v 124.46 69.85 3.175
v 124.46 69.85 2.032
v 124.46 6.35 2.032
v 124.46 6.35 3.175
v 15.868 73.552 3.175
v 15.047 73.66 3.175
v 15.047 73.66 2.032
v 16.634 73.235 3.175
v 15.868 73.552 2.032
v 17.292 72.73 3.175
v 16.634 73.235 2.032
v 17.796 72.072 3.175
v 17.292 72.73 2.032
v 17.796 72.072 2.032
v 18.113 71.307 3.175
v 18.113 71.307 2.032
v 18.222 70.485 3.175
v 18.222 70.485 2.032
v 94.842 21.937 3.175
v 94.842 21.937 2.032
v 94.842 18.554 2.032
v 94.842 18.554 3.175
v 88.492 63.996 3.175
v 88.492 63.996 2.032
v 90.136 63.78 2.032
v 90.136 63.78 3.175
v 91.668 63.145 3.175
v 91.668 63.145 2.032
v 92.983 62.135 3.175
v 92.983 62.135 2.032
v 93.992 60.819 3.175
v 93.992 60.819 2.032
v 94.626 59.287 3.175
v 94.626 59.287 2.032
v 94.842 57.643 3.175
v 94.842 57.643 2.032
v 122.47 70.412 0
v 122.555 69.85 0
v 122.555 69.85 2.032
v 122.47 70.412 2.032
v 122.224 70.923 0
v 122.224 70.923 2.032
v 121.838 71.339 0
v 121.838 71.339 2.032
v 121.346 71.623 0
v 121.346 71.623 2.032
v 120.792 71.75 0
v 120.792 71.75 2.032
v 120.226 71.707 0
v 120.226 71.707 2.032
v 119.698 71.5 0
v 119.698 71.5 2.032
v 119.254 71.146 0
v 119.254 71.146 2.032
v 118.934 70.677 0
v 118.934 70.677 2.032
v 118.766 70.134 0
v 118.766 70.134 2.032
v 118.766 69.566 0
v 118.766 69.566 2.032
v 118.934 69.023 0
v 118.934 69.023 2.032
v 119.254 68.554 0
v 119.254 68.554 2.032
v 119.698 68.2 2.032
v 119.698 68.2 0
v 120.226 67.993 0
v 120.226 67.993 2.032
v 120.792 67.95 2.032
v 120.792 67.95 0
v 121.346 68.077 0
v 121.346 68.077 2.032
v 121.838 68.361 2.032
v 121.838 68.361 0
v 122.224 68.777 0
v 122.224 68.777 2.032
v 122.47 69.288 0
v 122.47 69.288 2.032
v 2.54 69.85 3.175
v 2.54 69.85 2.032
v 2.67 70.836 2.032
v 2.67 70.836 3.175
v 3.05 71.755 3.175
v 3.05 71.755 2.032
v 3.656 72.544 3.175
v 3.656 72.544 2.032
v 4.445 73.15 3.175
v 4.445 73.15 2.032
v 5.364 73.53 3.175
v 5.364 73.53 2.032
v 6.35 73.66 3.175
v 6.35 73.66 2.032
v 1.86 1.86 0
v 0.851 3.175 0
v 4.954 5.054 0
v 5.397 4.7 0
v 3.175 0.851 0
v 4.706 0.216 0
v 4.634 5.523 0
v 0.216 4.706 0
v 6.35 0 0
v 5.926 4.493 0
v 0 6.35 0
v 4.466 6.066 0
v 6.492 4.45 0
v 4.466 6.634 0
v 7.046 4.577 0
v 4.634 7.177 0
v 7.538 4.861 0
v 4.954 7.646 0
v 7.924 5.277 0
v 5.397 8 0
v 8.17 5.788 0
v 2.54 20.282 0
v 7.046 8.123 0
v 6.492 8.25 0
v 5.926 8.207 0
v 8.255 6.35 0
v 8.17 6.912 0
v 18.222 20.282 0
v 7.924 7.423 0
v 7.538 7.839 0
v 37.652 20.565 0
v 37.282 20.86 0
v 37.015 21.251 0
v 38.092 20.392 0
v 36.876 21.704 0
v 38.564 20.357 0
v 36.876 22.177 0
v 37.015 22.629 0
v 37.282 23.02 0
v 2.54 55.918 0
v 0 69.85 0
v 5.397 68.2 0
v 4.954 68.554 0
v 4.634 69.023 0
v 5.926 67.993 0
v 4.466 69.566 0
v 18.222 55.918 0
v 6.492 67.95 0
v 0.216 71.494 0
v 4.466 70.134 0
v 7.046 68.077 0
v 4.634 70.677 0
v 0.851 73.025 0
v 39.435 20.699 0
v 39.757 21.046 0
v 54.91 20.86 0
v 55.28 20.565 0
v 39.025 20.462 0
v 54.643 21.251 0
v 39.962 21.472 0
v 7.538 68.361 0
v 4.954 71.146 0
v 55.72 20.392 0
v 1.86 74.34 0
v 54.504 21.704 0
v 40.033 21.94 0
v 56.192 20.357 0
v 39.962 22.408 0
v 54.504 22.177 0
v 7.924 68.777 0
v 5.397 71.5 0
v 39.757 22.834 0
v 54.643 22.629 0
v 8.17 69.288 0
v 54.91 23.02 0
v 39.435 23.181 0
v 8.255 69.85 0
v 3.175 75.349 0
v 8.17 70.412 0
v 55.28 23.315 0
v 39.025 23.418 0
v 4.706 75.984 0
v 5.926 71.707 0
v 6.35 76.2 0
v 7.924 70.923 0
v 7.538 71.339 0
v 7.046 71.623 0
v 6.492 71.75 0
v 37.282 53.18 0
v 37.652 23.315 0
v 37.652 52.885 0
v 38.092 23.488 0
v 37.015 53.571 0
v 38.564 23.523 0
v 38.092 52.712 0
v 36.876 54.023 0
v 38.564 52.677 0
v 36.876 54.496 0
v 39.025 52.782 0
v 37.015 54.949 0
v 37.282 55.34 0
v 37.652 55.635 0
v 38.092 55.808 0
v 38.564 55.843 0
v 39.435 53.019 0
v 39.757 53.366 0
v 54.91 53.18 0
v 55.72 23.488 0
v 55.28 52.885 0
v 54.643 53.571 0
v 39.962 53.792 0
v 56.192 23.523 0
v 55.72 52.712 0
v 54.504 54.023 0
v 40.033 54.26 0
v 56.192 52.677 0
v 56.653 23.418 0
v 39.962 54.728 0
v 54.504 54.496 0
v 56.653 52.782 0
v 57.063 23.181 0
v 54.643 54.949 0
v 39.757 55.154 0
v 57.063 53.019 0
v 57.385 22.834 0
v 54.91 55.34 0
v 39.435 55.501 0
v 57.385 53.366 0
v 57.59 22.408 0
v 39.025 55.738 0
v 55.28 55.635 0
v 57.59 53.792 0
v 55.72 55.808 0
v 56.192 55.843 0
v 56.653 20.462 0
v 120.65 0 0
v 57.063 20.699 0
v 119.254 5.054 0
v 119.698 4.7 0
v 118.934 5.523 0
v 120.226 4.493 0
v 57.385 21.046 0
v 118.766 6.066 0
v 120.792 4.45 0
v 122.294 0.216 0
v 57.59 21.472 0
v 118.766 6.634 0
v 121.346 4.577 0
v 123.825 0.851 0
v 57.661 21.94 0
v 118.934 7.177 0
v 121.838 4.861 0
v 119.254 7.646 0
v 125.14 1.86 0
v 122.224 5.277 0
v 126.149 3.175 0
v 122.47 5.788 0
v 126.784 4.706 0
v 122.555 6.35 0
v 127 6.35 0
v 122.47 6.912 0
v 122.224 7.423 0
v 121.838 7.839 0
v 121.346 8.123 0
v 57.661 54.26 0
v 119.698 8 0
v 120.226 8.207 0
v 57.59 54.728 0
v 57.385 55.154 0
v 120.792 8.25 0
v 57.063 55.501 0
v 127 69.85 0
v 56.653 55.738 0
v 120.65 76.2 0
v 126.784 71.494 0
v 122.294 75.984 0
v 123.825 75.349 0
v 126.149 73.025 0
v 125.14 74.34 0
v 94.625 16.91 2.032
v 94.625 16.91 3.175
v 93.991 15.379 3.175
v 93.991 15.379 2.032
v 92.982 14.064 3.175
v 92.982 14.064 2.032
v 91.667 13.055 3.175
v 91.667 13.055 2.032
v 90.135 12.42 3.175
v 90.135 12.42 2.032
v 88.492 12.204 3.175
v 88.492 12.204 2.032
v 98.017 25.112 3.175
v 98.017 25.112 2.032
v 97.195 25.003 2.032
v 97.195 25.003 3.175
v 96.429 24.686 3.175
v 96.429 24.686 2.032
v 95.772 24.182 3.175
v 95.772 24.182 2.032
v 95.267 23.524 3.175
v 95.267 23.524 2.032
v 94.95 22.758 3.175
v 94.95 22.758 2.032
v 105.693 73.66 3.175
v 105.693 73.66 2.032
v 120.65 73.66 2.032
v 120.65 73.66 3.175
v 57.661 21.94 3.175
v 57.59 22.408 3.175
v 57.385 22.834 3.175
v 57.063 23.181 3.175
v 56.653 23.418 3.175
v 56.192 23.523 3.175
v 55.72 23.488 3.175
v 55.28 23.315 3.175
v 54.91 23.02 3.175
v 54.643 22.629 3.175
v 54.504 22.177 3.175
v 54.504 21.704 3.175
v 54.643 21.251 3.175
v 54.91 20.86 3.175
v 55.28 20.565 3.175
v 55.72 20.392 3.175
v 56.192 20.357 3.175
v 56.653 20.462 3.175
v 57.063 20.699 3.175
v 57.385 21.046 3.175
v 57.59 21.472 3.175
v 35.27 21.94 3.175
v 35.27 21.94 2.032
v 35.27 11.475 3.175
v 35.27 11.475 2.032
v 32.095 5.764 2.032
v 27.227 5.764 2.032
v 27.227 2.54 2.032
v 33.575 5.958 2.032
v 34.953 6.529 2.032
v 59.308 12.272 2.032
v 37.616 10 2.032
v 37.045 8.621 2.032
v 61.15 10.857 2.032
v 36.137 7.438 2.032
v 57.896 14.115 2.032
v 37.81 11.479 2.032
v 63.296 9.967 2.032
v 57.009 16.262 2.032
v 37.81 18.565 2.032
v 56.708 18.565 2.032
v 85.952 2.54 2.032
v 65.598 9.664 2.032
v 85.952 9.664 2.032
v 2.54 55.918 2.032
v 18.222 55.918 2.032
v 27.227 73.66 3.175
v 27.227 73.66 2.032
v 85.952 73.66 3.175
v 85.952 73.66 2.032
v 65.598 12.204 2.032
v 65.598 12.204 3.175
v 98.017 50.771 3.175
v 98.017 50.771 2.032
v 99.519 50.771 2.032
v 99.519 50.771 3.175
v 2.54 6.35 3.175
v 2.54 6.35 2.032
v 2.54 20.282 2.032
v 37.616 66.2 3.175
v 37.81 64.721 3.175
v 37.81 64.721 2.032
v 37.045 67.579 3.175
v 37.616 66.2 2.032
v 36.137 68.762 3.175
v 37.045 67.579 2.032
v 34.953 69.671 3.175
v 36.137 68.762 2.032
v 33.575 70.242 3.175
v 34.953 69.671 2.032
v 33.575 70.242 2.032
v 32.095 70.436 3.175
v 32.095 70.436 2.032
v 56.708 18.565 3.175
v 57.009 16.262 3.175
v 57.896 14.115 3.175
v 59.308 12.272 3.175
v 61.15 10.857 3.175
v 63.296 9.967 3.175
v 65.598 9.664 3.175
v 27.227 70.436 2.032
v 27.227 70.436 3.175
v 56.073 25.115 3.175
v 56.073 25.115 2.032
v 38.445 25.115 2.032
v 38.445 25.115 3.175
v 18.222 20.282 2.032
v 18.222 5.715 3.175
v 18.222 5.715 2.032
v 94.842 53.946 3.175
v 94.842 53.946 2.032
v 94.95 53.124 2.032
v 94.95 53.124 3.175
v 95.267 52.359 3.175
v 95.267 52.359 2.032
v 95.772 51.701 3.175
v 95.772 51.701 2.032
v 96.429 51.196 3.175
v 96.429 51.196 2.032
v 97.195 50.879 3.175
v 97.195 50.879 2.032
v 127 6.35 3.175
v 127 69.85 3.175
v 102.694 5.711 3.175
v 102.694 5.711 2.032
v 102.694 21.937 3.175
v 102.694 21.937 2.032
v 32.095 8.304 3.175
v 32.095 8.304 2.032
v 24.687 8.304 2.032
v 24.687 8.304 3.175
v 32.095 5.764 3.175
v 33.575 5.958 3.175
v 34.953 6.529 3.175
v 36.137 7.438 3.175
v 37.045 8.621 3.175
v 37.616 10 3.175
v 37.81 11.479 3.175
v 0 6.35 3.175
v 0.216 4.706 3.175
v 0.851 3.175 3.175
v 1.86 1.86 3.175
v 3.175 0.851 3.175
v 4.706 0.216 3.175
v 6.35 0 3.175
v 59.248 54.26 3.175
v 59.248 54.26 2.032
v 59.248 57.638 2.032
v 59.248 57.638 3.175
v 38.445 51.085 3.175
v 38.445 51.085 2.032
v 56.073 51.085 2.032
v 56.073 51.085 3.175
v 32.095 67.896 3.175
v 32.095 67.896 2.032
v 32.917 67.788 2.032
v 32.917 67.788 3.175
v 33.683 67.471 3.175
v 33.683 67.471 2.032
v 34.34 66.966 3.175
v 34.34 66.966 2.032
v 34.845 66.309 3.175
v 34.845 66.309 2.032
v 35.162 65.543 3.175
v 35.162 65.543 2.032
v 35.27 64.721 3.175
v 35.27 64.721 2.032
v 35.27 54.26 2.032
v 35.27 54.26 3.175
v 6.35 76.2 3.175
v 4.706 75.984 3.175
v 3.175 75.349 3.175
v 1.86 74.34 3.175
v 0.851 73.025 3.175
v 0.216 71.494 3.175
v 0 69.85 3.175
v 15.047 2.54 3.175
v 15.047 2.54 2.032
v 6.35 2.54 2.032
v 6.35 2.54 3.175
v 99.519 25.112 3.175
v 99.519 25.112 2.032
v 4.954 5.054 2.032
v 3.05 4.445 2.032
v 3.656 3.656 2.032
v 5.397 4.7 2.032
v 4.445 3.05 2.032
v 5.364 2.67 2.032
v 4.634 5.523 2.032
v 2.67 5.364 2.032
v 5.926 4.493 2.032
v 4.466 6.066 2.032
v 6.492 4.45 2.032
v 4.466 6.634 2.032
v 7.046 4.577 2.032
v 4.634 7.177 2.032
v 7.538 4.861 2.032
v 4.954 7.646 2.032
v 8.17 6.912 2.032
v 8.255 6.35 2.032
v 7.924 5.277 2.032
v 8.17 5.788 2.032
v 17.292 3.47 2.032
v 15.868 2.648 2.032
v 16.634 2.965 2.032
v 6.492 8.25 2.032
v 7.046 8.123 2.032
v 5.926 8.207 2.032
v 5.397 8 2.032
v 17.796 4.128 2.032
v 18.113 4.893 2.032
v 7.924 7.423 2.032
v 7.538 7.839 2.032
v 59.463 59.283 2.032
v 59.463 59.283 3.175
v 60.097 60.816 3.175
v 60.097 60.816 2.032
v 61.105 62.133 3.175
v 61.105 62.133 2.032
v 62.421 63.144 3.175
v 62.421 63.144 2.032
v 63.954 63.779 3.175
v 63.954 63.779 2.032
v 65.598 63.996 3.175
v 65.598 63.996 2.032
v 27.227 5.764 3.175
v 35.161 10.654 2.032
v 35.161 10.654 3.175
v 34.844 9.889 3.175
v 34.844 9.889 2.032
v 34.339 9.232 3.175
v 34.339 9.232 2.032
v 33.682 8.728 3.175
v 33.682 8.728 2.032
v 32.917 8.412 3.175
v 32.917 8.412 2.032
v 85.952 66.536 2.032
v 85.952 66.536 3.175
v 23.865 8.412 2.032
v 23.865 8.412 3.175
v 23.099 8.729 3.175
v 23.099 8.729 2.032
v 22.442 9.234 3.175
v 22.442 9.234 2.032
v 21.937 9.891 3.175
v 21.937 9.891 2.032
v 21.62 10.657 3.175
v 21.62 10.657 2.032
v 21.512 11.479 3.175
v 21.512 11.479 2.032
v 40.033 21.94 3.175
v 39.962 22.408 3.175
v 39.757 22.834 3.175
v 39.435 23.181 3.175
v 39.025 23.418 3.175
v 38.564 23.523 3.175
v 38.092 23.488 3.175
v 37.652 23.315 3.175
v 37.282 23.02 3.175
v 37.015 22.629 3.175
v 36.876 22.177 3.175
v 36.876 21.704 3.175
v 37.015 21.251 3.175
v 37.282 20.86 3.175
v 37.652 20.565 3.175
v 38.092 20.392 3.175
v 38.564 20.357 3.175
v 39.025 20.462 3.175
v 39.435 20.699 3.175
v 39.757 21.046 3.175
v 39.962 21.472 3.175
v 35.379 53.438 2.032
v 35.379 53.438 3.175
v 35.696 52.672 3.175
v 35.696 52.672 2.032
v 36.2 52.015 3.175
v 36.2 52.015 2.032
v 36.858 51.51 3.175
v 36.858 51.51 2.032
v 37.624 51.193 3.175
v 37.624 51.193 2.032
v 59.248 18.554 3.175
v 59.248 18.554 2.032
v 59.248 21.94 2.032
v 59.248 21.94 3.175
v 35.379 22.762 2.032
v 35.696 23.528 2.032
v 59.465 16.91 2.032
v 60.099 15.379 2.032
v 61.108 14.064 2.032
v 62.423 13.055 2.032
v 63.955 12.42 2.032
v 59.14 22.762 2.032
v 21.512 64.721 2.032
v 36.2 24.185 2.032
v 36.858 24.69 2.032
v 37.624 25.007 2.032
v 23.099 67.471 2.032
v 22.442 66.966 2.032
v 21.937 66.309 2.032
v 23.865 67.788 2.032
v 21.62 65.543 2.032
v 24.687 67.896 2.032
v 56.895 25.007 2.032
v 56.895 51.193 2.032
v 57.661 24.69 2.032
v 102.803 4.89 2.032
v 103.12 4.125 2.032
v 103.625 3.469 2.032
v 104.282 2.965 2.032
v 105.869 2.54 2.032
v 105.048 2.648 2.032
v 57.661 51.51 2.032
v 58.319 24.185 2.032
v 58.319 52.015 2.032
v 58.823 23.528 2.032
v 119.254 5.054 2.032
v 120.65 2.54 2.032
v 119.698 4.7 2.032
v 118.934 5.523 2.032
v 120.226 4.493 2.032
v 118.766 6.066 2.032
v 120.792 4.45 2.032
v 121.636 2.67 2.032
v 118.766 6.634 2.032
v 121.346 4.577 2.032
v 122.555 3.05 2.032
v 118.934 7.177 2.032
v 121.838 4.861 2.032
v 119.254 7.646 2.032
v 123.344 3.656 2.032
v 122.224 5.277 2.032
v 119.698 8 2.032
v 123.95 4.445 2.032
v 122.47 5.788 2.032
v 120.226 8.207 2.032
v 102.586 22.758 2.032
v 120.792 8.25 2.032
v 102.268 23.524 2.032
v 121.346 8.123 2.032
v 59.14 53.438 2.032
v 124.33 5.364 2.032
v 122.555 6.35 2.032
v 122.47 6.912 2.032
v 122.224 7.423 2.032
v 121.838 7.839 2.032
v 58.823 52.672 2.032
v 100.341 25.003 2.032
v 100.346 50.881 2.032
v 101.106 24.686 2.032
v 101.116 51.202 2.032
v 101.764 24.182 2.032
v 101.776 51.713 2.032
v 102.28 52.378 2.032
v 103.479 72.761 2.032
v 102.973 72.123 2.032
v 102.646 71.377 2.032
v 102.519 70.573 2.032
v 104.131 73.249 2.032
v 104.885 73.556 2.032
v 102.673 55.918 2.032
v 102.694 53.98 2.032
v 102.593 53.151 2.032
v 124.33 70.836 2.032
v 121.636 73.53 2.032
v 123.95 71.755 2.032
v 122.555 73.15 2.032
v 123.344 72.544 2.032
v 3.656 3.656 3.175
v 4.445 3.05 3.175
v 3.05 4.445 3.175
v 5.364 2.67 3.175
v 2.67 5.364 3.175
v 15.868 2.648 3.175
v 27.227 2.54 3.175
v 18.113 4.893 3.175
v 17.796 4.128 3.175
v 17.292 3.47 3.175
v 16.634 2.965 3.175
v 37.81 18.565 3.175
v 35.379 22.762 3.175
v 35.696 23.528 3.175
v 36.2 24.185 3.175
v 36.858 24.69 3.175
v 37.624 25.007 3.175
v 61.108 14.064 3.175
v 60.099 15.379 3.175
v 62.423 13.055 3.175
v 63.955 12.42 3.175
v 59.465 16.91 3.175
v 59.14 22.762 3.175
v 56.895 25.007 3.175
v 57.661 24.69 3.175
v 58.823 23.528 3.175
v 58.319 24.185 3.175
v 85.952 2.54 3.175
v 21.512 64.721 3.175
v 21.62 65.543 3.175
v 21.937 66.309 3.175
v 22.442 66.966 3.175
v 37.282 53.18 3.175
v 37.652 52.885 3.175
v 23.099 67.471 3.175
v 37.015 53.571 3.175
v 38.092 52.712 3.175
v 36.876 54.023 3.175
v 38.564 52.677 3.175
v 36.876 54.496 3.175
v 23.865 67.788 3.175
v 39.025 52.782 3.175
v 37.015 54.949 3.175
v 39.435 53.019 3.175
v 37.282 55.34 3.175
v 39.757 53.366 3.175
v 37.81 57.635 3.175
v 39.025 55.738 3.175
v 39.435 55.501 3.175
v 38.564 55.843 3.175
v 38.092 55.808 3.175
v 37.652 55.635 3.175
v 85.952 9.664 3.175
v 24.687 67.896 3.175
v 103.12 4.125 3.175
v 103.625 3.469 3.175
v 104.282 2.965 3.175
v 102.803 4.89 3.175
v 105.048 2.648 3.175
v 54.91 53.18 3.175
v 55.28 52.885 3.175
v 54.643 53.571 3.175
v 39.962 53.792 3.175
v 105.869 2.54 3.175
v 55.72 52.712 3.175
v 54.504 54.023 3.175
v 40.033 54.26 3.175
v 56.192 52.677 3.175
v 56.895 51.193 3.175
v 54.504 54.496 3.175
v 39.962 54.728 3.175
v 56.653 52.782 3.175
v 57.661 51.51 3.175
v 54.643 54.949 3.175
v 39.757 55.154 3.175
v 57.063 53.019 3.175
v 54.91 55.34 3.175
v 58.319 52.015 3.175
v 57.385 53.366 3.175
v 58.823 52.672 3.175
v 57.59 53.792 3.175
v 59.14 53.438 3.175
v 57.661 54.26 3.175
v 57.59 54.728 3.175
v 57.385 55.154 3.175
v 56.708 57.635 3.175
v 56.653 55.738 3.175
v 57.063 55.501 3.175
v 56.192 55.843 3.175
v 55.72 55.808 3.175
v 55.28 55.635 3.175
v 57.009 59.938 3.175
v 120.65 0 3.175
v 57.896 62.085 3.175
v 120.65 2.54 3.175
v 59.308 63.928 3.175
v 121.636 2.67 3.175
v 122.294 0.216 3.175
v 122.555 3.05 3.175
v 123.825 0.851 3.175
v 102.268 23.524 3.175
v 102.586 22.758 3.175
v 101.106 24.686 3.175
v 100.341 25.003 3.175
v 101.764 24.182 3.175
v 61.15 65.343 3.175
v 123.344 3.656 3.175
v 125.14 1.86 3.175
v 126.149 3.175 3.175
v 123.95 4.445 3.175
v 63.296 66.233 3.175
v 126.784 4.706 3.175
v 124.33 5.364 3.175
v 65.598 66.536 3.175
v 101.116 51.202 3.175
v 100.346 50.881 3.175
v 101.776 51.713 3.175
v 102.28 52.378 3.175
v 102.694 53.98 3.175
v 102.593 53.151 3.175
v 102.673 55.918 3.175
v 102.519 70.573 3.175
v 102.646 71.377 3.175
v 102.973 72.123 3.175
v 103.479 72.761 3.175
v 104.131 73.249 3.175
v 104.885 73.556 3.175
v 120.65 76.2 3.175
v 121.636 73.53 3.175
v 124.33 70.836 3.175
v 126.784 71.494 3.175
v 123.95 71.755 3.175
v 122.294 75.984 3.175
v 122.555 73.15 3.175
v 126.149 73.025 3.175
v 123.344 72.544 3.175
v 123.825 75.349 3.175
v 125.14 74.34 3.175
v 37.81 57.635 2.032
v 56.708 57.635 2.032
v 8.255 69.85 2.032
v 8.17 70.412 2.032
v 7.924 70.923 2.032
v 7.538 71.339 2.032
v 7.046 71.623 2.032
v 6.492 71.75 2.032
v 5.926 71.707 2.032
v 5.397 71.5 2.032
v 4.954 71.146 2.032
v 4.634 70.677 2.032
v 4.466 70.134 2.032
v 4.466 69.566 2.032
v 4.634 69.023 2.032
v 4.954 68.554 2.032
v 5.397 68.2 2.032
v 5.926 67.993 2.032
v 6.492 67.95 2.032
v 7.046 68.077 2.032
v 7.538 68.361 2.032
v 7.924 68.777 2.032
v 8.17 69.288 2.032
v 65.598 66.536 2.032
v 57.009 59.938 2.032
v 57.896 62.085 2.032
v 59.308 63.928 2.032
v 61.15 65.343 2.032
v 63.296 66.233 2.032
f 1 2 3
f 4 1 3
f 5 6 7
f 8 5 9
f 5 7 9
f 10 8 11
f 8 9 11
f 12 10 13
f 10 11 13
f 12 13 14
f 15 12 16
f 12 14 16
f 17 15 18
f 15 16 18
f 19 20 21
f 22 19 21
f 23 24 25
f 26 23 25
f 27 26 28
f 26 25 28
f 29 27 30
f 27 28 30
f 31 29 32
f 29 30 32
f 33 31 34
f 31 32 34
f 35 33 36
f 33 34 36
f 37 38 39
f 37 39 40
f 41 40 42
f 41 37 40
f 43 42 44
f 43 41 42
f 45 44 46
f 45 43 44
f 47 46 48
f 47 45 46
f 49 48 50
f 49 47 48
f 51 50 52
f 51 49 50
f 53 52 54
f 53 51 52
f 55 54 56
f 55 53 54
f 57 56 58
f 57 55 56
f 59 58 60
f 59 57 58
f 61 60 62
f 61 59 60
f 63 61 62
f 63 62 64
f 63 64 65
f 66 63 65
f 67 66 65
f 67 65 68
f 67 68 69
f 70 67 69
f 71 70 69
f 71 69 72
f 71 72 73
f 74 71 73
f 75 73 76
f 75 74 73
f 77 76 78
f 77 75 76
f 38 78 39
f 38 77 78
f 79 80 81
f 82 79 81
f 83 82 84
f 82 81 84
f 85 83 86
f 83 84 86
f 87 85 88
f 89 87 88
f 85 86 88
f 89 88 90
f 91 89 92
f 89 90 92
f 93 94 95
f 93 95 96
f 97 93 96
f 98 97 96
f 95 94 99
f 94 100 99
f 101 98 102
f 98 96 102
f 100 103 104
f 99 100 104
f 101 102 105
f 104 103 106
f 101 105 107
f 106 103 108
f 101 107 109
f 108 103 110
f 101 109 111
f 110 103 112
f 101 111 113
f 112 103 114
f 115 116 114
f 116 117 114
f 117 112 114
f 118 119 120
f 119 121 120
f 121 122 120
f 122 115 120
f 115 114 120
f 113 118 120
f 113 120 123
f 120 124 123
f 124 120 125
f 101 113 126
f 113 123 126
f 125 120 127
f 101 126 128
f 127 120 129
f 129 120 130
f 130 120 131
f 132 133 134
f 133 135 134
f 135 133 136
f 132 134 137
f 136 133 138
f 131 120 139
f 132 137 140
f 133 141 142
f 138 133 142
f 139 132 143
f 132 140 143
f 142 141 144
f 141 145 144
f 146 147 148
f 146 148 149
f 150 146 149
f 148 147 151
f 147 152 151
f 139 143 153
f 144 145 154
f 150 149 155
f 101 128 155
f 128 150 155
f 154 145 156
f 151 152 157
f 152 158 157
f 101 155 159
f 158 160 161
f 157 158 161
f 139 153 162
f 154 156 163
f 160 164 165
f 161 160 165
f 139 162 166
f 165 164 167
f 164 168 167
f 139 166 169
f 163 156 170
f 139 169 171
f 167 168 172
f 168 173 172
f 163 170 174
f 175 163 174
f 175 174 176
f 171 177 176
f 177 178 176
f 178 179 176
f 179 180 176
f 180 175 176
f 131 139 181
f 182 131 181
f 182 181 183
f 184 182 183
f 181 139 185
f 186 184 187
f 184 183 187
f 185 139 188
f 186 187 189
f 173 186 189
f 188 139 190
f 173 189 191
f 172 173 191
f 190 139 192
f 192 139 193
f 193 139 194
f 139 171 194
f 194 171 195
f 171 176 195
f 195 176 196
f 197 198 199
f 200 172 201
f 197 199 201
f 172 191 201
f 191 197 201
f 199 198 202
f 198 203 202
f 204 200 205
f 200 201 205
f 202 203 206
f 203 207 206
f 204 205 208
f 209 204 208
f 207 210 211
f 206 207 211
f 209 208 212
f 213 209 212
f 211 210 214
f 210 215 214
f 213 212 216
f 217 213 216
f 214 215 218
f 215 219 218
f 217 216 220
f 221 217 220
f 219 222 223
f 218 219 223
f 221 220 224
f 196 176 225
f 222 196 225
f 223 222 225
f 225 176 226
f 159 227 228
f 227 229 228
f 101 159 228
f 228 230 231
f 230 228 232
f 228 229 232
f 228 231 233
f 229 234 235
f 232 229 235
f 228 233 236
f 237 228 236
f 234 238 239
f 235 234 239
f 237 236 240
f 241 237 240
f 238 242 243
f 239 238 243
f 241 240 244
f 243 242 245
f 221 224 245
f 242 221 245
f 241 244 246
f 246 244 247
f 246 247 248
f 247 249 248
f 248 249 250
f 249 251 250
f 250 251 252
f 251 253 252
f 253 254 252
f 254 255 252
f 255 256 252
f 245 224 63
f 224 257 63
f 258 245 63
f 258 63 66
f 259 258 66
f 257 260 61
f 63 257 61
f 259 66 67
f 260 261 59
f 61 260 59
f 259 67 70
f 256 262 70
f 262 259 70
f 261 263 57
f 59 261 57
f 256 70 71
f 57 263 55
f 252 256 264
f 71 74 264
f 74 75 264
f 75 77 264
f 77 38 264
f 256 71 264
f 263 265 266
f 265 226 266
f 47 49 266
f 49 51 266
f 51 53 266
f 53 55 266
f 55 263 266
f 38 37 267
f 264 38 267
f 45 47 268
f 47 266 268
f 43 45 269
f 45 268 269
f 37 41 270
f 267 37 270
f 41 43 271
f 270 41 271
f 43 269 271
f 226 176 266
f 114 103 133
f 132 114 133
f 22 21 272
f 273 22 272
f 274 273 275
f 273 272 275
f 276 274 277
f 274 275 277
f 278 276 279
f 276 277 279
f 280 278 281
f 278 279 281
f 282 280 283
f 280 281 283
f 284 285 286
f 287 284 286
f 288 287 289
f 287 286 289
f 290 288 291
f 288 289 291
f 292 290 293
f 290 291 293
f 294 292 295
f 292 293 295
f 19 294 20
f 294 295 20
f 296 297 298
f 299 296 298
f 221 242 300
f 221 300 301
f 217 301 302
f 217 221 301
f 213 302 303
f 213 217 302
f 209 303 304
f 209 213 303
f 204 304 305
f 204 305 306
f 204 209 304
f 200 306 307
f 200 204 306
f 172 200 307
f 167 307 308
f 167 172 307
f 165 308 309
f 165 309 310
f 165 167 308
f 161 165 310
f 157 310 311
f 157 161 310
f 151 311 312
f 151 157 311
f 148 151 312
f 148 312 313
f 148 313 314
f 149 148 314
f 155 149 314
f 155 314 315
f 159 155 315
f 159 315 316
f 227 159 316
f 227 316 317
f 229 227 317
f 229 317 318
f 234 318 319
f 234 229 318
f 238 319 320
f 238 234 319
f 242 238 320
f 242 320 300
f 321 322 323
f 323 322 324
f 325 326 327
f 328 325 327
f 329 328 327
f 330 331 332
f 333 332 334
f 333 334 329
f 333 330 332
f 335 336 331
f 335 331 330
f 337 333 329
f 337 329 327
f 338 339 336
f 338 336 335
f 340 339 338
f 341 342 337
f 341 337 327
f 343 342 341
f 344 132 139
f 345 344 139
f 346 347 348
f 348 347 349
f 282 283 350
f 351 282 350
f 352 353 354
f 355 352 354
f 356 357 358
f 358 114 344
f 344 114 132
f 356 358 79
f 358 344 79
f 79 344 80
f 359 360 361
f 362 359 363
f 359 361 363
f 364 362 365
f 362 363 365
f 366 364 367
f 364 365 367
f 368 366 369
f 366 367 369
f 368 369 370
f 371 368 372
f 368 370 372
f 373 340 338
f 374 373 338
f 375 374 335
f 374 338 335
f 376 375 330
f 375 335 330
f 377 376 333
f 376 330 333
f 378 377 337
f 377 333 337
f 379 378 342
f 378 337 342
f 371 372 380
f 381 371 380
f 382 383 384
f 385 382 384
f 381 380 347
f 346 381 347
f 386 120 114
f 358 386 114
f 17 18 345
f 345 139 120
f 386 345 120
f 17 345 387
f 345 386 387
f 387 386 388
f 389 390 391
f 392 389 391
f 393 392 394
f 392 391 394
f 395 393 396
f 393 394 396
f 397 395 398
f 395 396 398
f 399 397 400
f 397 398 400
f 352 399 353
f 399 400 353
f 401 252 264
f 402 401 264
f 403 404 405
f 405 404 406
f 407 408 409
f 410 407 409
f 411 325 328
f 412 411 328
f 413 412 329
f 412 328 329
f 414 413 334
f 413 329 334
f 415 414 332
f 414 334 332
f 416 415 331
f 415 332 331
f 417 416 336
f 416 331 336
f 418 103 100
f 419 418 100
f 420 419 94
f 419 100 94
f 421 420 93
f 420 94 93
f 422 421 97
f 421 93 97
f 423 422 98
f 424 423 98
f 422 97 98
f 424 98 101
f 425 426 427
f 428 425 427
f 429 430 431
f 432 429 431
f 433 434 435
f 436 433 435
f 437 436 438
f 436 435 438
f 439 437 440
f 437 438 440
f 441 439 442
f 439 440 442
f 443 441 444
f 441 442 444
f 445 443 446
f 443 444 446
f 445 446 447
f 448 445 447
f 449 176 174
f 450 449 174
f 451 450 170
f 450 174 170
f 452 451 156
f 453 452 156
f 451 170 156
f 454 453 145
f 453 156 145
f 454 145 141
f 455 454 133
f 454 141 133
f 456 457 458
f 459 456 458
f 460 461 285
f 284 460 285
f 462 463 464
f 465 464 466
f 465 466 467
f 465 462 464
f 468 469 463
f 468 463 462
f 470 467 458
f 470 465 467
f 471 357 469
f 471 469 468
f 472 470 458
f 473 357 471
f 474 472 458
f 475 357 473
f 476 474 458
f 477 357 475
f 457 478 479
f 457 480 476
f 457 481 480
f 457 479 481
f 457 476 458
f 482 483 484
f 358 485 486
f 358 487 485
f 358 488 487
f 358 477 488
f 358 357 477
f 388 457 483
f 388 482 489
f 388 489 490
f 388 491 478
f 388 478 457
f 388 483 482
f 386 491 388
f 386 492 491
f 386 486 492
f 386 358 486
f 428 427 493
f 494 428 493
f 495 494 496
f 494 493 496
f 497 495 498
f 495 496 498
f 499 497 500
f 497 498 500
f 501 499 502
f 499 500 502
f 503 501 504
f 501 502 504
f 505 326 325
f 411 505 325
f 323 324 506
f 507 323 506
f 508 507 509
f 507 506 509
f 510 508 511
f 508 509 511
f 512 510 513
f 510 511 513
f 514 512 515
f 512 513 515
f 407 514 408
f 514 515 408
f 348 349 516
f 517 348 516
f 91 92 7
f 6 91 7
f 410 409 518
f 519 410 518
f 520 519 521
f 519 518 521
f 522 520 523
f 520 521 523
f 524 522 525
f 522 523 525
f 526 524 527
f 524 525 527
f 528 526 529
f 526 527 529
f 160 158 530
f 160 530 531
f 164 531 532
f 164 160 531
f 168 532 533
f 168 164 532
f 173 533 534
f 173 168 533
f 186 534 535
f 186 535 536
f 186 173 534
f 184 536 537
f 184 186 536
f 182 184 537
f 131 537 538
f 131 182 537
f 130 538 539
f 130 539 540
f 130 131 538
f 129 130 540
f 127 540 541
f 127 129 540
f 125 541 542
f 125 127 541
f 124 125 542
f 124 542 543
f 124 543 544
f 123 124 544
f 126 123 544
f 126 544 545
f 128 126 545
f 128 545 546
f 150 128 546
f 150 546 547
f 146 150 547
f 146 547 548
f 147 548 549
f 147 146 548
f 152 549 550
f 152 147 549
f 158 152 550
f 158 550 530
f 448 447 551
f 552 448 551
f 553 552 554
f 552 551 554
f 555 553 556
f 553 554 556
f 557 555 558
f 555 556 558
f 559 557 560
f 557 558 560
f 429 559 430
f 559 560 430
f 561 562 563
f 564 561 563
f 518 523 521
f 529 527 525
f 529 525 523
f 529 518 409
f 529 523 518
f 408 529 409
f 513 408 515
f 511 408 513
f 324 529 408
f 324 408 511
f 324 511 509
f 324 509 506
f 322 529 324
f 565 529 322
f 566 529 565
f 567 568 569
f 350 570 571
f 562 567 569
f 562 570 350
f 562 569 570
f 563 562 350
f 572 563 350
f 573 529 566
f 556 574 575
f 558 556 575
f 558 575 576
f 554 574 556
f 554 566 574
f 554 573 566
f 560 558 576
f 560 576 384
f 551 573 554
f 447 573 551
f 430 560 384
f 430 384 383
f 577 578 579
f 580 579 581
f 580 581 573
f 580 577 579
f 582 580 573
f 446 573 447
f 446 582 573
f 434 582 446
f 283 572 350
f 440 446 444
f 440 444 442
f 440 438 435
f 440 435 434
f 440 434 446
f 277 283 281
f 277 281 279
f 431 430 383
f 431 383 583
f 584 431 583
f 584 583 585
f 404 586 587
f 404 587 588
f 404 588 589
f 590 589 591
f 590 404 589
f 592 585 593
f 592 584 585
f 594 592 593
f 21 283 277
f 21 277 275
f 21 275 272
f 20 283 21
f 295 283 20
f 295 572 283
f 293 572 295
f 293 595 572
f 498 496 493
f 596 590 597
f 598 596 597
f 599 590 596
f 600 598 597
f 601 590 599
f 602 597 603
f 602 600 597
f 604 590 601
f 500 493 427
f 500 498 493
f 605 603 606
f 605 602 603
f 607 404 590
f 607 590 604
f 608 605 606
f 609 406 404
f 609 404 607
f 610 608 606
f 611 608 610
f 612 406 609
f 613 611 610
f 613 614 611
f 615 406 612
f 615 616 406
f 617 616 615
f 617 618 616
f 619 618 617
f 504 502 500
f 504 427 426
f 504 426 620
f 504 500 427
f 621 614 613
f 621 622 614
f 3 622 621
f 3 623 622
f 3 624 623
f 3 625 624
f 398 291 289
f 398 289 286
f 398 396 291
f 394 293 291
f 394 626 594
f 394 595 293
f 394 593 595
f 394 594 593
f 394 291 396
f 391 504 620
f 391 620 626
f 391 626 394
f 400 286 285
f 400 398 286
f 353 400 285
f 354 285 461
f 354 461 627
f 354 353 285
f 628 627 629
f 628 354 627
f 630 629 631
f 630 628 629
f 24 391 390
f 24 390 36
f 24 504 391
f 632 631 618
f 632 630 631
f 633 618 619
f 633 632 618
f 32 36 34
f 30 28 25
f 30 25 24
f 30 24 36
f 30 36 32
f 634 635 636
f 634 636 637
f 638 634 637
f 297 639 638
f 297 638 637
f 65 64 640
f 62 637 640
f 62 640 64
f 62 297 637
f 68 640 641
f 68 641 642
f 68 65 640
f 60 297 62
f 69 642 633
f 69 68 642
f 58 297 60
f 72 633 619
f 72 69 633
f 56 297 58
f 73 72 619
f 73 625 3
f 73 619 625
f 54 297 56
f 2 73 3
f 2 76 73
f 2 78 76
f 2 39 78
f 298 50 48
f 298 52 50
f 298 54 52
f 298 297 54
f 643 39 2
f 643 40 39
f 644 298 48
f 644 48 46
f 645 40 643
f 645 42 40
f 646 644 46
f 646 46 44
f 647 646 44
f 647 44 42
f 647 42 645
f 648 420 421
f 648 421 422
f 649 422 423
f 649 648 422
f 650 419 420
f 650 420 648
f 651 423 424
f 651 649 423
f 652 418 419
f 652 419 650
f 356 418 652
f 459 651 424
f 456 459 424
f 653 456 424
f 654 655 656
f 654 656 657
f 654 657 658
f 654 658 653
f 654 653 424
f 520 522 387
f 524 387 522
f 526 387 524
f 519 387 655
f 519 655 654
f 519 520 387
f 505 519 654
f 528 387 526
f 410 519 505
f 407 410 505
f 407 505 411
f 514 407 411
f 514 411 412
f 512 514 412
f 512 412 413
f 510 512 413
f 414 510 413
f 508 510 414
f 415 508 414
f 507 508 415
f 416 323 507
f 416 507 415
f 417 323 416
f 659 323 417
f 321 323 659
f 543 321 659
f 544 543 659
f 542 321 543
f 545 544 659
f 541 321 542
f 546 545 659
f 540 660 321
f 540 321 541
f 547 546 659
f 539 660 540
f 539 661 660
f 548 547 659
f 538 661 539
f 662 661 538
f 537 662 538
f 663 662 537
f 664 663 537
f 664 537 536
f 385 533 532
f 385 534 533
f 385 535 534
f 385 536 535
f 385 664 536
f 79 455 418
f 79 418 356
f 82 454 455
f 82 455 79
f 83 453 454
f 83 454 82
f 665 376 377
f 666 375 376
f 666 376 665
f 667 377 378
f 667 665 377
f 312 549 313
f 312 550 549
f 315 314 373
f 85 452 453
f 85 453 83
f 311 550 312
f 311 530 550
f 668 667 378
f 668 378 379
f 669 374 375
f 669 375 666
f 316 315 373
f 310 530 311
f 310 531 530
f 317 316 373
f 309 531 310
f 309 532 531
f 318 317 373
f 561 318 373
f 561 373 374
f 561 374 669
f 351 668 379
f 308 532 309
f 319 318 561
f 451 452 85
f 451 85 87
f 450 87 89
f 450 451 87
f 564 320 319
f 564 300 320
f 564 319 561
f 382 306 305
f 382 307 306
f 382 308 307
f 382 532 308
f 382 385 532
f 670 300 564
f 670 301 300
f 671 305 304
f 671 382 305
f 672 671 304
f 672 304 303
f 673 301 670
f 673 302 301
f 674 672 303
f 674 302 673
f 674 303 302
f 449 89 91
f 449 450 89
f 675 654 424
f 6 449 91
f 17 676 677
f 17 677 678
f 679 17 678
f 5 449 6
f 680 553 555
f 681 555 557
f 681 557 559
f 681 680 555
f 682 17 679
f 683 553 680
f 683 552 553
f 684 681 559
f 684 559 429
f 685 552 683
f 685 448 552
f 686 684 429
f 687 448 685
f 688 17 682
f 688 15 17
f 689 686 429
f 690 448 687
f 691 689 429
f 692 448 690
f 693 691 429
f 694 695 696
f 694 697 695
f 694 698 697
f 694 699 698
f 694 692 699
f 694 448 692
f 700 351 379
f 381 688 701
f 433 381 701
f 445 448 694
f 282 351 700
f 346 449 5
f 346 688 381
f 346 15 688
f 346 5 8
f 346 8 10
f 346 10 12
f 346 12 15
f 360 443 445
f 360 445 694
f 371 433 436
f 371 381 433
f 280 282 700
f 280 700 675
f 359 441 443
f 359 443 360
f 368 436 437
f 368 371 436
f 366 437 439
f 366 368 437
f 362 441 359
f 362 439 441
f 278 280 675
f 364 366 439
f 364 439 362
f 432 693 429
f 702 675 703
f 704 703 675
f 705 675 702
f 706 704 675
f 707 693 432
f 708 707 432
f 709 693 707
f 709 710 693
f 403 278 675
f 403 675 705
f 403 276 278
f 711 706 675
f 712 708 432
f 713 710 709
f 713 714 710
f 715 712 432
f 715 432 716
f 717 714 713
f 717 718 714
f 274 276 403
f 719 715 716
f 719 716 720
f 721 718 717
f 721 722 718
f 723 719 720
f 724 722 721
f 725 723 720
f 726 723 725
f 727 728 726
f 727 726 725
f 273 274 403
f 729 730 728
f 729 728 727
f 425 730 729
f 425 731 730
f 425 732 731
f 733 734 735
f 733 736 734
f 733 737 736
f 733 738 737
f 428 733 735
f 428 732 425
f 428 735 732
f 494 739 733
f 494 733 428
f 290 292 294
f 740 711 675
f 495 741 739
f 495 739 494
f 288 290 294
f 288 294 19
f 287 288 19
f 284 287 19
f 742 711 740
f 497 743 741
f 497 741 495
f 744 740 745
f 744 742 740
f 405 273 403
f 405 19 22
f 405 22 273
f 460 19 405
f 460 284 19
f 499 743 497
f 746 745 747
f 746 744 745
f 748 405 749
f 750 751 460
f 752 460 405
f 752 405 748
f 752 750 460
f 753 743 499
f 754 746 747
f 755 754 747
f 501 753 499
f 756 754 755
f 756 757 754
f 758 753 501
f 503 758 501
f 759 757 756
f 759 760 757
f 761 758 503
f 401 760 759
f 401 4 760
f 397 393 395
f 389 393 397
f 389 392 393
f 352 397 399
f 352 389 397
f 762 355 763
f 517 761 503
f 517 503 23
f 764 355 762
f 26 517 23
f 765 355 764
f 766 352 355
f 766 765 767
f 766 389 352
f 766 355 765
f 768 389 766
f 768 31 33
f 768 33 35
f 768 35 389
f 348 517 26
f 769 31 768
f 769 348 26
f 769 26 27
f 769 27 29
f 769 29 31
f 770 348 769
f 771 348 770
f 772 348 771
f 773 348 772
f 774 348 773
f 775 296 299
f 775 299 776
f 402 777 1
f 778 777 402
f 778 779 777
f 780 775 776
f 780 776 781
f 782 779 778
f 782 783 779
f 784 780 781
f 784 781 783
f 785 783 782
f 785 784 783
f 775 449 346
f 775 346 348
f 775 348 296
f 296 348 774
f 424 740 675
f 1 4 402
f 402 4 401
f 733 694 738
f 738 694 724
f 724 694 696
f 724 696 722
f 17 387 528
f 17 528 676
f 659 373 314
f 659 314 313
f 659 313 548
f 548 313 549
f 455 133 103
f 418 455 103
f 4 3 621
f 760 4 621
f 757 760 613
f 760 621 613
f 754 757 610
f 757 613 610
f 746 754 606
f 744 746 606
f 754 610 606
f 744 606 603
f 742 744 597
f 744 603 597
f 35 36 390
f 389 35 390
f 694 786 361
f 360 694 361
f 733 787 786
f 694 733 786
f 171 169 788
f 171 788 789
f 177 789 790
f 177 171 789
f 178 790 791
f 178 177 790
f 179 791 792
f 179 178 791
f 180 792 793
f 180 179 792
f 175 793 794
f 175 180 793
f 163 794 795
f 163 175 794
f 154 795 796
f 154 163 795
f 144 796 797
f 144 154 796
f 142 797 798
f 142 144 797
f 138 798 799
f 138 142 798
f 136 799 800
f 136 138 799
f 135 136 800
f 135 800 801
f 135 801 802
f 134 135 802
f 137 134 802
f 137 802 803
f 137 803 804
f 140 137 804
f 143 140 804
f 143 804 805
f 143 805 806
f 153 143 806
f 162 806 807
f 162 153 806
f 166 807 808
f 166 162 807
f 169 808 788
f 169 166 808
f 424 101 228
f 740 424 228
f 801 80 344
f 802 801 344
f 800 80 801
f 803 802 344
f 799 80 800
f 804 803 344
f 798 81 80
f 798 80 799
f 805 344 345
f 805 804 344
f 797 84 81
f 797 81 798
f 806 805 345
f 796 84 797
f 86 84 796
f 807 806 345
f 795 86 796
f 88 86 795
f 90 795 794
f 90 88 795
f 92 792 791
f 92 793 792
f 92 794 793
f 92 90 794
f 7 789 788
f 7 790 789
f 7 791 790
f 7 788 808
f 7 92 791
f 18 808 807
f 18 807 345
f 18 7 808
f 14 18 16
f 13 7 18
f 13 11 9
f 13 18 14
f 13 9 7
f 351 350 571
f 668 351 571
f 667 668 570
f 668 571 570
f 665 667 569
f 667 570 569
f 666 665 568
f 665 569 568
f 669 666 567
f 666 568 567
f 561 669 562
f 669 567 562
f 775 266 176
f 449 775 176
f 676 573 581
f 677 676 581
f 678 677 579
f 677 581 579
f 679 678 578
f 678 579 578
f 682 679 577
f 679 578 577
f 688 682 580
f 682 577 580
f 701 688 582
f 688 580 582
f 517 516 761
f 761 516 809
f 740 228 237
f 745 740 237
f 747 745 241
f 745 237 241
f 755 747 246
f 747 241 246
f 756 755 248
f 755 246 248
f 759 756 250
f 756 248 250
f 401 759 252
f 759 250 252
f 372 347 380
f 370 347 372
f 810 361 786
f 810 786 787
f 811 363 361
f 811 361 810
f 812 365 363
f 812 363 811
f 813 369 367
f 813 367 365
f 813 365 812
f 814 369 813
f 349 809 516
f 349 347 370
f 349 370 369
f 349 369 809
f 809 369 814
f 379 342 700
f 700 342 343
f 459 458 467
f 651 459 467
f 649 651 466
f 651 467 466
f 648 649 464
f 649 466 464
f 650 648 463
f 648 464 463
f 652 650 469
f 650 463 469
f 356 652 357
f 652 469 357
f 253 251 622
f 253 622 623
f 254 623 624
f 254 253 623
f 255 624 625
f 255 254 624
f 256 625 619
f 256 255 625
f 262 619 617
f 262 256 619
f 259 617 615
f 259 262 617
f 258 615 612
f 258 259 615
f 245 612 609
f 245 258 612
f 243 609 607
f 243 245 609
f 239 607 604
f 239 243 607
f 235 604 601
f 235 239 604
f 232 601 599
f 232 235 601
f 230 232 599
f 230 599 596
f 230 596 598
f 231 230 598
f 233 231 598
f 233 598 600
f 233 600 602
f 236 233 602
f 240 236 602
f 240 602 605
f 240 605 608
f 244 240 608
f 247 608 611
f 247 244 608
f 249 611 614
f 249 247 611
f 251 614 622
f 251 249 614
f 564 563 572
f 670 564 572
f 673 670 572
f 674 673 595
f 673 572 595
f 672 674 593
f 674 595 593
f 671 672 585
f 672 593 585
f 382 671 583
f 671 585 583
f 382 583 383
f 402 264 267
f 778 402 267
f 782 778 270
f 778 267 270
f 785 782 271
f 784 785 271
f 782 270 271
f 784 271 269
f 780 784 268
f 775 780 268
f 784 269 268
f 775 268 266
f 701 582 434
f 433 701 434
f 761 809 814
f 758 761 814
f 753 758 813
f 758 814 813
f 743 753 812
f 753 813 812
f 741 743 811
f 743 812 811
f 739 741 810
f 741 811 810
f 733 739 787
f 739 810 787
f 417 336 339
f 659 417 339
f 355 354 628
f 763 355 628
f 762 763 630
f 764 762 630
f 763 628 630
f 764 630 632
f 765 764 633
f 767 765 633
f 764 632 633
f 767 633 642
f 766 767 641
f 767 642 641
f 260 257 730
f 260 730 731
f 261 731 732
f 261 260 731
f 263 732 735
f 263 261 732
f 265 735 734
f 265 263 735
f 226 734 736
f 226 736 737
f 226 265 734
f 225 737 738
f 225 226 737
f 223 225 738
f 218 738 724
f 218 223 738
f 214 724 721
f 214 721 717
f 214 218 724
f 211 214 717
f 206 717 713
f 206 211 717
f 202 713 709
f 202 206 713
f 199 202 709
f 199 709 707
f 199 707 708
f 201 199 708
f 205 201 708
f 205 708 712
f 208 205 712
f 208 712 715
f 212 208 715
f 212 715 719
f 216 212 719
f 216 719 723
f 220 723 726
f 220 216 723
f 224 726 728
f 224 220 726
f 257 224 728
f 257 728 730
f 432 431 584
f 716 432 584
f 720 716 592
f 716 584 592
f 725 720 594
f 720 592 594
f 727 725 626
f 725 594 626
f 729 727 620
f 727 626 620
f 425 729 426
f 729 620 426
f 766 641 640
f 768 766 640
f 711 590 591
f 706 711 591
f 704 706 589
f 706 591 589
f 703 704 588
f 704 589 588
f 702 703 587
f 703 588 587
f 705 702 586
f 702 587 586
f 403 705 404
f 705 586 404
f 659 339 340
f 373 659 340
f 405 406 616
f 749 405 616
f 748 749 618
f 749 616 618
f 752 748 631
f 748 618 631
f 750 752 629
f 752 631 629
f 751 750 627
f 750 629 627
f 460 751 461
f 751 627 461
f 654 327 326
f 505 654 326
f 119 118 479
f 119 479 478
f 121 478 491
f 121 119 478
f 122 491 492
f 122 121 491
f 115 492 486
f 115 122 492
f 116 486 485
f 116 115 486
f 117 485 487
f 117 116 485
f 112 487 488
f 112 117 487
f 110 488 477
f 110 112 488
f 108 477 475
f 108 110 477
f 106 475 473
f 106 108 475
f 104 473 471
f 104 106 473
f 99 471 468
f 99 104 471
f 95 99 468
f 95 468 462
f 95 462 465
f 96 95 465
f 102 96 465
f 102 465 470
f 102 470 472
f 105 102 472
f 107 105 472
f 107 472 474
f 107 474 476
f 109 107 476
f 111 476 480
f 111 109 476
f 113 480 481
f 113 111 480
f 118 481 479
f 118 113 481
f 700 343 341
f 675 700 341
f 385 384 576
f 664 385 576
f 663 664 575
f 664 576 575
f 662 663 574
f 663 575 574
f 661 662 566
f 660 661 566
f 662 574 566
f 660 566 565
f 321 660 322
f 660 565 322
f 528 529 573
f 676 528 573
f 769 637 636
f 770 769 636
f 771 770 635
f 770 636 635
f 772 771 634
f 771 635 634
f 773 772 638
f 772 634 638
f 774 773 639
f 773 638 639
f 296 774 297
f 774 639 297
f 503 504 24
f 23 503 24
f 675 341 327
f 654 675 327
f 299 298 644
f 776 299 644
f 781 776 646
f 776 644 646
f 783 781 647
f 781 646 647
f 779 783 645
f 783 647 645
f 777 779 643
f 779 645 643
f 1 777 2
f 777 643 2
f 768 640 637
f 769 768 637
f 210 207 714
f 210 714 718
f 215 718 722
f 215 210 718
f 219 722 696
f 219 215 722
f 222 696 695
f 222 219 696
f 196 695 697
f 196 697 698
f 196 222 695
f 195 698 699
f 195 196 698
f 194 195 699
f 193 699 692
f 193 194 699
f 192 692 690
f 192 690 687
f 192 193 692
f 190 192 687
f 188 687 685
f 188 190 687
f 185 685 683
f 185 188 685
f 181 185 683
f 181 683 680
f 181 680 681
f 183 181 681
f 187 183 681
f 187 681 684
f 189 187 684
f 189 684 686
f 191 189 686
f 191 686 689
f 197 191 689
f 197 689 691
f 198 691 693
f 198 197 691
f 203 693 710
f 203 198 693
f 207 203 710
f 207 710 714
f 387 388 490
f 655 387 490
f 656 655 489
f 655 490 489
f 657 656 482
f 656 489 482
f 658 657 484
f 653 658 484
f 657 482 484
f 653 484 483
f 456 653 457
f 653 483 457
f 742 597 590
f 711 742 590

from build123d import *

# Parameters (mm, degrees)
F0_R     = 1.5875
F1_DEPTH = 3.175
F2_DEPTH = 3.175
F3_DEPTH = 2.032
F4_DEPTH = 2.032
F5_DEPTH = 2.032
F0_R_2   = 1.905
F6_DEPTH = 2.032
F7_DEPTH = 2.032


with BuildPart() as f1:
    # F0 (on Top) → F1 (new body)
    with BuildSketch(Plane.XY):
        with BuildLine():
            ThreePointArc((0, 6.35), (1.859872, 1.859872), (6.35, 0))
            Line((6.35, 0), (120.65, 0))
            ThreePointArc((120.65, 0), (125.140128, 1.859872), (127, 6.35))
            Line((127, 6.35), (127, 69.85))
            ThreePointArc((127, 69.85), (125.140128, 74.340128), (120.65, 76.2))
            Line((120.65, 76.2), (88.491705, 76.2))
            Line((88.491705, 76.2), (88.491705, 63.996129))
            ThreePointArc((88.491705, 63.996129), (92.983074, 62.135015), (94.841704, 57.642618))
            Line((94.841704, 57.642618), (94.841704, 53.946127))
            ThreePointArc((94.841704, 53.946127), (95.77164, 51.701063), (98.016704, 50.771127))
            Line((98.016704, 50.771127), (99.518864, 50.771127))
            ThreePointArc((99.518864, 50.771127), (101.7757, 51.712898), (102.693688, 53.979511))
            Line((102.693688, 53.979511), (102.673301, 55.918332))
            Line((102.673301, 55.918332), (102.519207, 70.572822))
            ThreePointArc((102.519207, 70.572822), (103.479196, 72.760902), (105.692992, 73.66))
            Line((105.692992, 73.66), (120.65, 73.66))
            ThreePointArc((120.65, 73.66), (123.344077, 72.544077), (124.46, 69.85))
            Line((124.46, 69.85), (124.46, 55.918332))
            Line((124.46, 55.918332), (124.46, 20.257623))
            Line((124.46, 20.257623), (124.46, 6.35))
            ThreePointArc((124.46, 6.35), (123.344077, 3.655923), (120.65, 2.54))
            Line((120.65, 2.54), (105.868862, 2.54))
            ThreePointArc((105.868862, 2.54), (103.625039, 3.468695), (102.693864, 5.711489))
            Line((102.693864, 5.711489), (102.693864, 20.281668))
            Line((102.693864, 20.281668), (102.693864, 21.936632))
            ThreePointArc((102.693864, 21.936632), (101.763928, 24.181696), (99.518864, 25.111632))
            Line((99.518864, 25.111632), (98.016704, 25.111632))
            ThreePointArc((98.016704, 25.111632), (95.77164, 24.181696), (94.841704, 21.936632))
            Line((94.841704, 21.936632), (94.841704, 18.553871))
            ThreePointArc((94.841704, 18.553871), (92.981832, 14.063743), (88.491704, 12.203871))
            Line((88.491704, 12.203871), (65.598477, 12.203871))
            ThreePointArc((65.598477, 12.203871), (61.108349, 14.063743), (59.248477, 18.553871))
            Line((59.248477, 18.553871), (59.248477, 21.940143))
            ThreePointArc((59.248477, 21.940143), (58.318541, 24.185207), (56.073477, 25.115143))
            Line((56.073477, 25.115143), (38.445395, 25.115143))
            ThreePointArc((38.445395, 25.115143), (36.200331, 24.185207), (35.270395, 21.940143))
            Line((35.270395, 21.940143), (35.270395, 11.475343))
            ThreePointArc((35.270395, 11.475343), (34.339286, 9.232426), (32.095397, 8.303664))
            Line((32.095397, 8.303664), (24.686663, 8.303664))
            ThreePointArc((24.686663, 8.303664), (22.441599, 9.2336), (21.511663, 11.478664))
            Line((21.511663, 11.478664), (21.511663, 64.721336))
            ThreePointArc((21.511663, 64.721336), (22.441599, 66.9664), (24.686663, 67.896336))
            Line((24.686663, 67.896336), (24.686663, 76.2))
            Line((24.686663, 76.2), (6.35, 76.2))
            ThreePointArc((6.35, 76.2), (1.859872, 74.340128), (0, 69.85))
            Line((0, 69.85), (0, 6.35))
        make_face()
        with BuildLine():
            Line((37.810397, 18.565171), (56.708484, 18.565171))
            ThreePointArc((56.708484, 18.565171), (59.308304, 12.271688), (65.598477, 9.663871))
            Line((65.598477, 9.663871), (85.951705, 9.663871))
            Line((85.951705, 9.663871), (85.951705, 2.54))
            Line((85.951705, 2.54), (27.226663, 2.54))
            Line((27.226663, 2.54), (27.226663, 5.763664))
            Line((27.226663, 5.763664), (32.095397, 5.763664))
            ThreePointArc((32.095397, 5.763664), (36.136512, 7.437548), (37.810397, 11.478664))
            Line((37.810397, 11.478664), (37.810397, 18.565171))
        make_face(mode=Mode.SUBTRACT)
        with BuildLine():
            ThreePointArc((6.35, 2.54), (3.655923, 3.655923), (2.54, 6.35))
            Line((2.54, 6.35), (2.54, 20.281668))
            Line((2.54, 20.281668), (2.54, 55.918332))
            Line((2.54, 55.918332), (2.54, 69.85))
            ThreePointArc((2.54, 69.85), (3.655923, 72.544077), (6.35, 73.66))
            Line((6.35, 73.66), (15.046535, 73.66))
            ThreePointArc((15.046535, 73.66), (17.291599, 72.730064), (18.221535, 70.485))
            Line((18.221535, 70.485), (18.221535, 55.918332))
            Line((18.221535, 55.918332), (18.221535, 20.281668))
            Line((18.221535, 20.281668), (18.221535, 5.715))
            ThreePointArc((18.221535, 5.715), (17.291599, 3.469936), (15.046535, 2.54))
            Line((15.046535, 2.54), (6.35, 2.54))
        make_face(mode=Mode.SUBTRACT)
        with Locations((38.445395, 21.940143)):
            Circle(F0_R, mode=Mode.SUBTRACT)
        with Locations((56.073477, 21.940143)):
            Circle(F0_R, mode=Mode.SUBTRACT)
    extrude(amount=F1_DEPTH)

    # F0 (on Top) → F2 (join)
    with BuildSketch(Plane.XY):
        with BuildLine():
            Line((88.491705, 76.2), (24.686663, 76.2))
            Line((24.686663, 76.2), (24.686663, 67.896336))
            Line((24.686663, 67.896336), (32.095397, 67.896336))
            ThreePointArc((32.095397, 67.896336), (34.340461, 66.9664), (35.270397, 64.721336))
            Line((35.270397, 64.721336), (35.270397, 54.259857))
            ThreePointArc((35.270397, 54.259857), (36.200333, 52.014793), (38.445397, 51.084857))
            Line((38.445397, 51.084857), (56.073482, 51.084857))
            ThreePointArc((56.073482, 51.084857), (58.318546, 52.014793), (59.248482, 54.259857))
            Line((59.248482, 54.259857), (59.248482, 57.638057))
            ThreePointArc((59.248482, 57.638057), (61.105496, 62.133402), (65.598477, 63.996129))
            Line((65.598477, 63.996129), (88.491705, 63.996129))
            Line((88.491705, 63.996129), (88.491705, 76.2))
        make_face()
        with Locations((38.445397, 54.259857)):
            Circle(F0_R, mode=Mode.SUBTRACT)
        with Locations((56.073482, 54.259857)):
            Circle(F0_R, mode=Mode.SUBTRACT)
        with BuildLine():
            Line((27.226663, 73.66), (85.951705, 73.66))
            Line((85.951705, 73.66), (85.951705, 66.536129))
            Line((85.951705, 66.536129), (65.598477, 66.536129))
            ThreePointArc((65.598477, 66.536129), (59.308304, 63.928312), (56.708484, 57.634829))
            Line((56.708484, 57.634829), (37.810397, 57.634829))
            Line((37.810397, 57.634829), (37.810397, 64.721336))
            ThreePointArc((37.810397, 64.721336), (36.136512, 68.762452), (32.095397, 70.436336))
            Line((32.095397, 70.436336), (27.226663, 70.436336))
            Line((27.226663, 70.436336), (27.226663, 73.66))
        make_face(mode=Mode.SUBTRACT)
    extrude(amount=F2_DEPTH)

    # F0 (on Top) → F3 (join)
    with BuildSketch(Plane.XY):
        with BuildLine():
            Line((85.951705, 66.536129), (85.951705, 73.66))
            Line((85.951705, 73.66), (27.226663, 73.66))
            Line((27.226663, 73.66), (27.226663, 70.436336))
            Line((27.226663, 70.436336), (32.095397, 70.436336))
            ThreePointArc((32.095397, 70.436336), (36.136512, 68.762452), (37.810397, 64.721336))
            Line((37.810397, 64.721336), (37.810397, 57.634829))
            Line((37.810397, 57.634829), (56.708484, 57.634829))
            ThreePointArc((56.708484, 57.634829), (59.308304, 63.928312), (65.598477, 66.536129))
            Line((65.598477, 66.536129), (85.951705, 66.536129))
        make_face()
    extrude(amount=F3_DEPTH)

    # F0 (on Top) → F4 (join)
    with BuildSketch(Plane.XY):
        with BuildLine():
            Line((32.095397, 67.896336), (24.686663, 67.896336))
            ThreePointArc((24.686663, 67.896336), (22.441599, 66.9664), (21.511663, 64.721336))
            Line((21.511663, 64.721336), (21.511663, 11.478664))
            ThreePointArc((21.511663, 11.478664), (22.441599, 9.2336), (24.686663, 8.303664))
            Line((24.686663, 8.303664), (32.095397, 8.303664))
            ThreePointArc((32.095397, 8.303664), (34.339286, 9.232426), (35.270395, 11.475343))
            Line((35.270395, 11.475343), (35.270395, 21.940143))
            ThreePointArc((35.270395, 21.940143), (36.200331, 24.185207), (38.445395, 25.115143))
            Line((38.445395, 25.115143), (56.073477, 25.115143))
            ThreePointArc((56.073477, 25.115143), (58.318541, 24.185207), (59.248477, 21.940143))
            Line((59.248477, 21.940143), (59.248477, 18.553871))
            ThreePointArc((59.248477, 18.553871), (61.108349, 14.063743), (65.598477, 12.203871))
            Line((65.598477, 12.203871), (88.491704, 12.203871))
            ThreePointArc((88.491704, 12.203871), (92.981832, 14.063743), (94.841704, 18.553871))
            Line((94.841704, 18.553871), (94.841704, 21.936632))
            ThreePointArc((94.841704, 21.936632), (95.77164, 24.181696), (98.016704, 25.111632))
            Line((98.016704, 25.111632), (99.518864, 25.111632))
            ThreePointArc((99.518864, 25.111632), (101.763928, 24.181696), (102.693864, 21.936632))
            Line((102.693864, 21.936632), (102.693864, 20.281668))
            Line((102.693864, 20.281668), (124.46, 20.257623))
            Line((124.46, 20.257623), (124.46, 55.918332))
            Line((124.46, 55.918332), (102.673301, 55.918332))
            Line((102.673301, 55.918332), (102.693688, 53.979511))
            ThreePointArc((102.693688, 53.979511), (101.7757, 51.712898), (99.518864, 50.771127))
            Line((99.518864, 50.771127), (98.016704, 50.771127))
            ThreePointArc((98.016704, 50.771127), (95.77164, 51.701063), (94.841704, 53.946127))
            Line((94.841704, 53.946127), (94.841704, 57.642618))
            ThreePointArc((94.841704, 57.642618), (92.983074, 62.135015), (88.491705, 63.996129))
            Line((88.491705, 63.996129), (65.598477, 63.996129))
            ThreePointArc((65.598477, 63.996129), (61.105496, 62.133402), (59.248482, 57.638057))
            Line((59.248482, 57.638057), (59.248482, 54.259857))
            ThreePointArc((59.248482, 54.259857), (58.318546, 52.014793), (56.073482, 51.084857))
            Line((56.073482, 51.084857), (38.445397, 51.084857))
            ThreePointArc((38.445397, 51.084857), (36.200333, 52.014793), (35.270397, 54.259857))
            Line((35.270397, 54.259857), (35.270397, 64.721336))
            ThreePointArc((35.270397, 64.721336), (34.340461, 66.9664), (32.095397, 67.896336))
        make_face()
    extrude(amount=F4_DEPTH)

    # F0 (on Top) → F5 (join)
    with BuildSketch(Plane.XY):
        with BuildLine():
            ThreePointArc((65.598477, 9.663871), (59.308304, 12.271688), (56.708484, 18.565171))
            Line((56.708484, 18.565171), (37.810397, 18.565171))
            Line((37.810397, 18.565171), (37.810397, 11.478664))
            ThreePointArc((37.810397, 11.478664), (36.136512, 7.437548), (32.095397, 5.763664))
            Line((32.095397, 5.763664), (27.226663, 5.763664))
            Line((27.226663, 5.763664), (27.226663, 2.54))
            Line((27.226663, 2.54), (85.951705, 2.54))
            Line((85.951705, 2.54), (85.951705, 9.663871))
            Line((85.951705, 9.663871), (65.598477, 9.663871))
        make_face()
    extrude(amount=F5_DEPTH)

    # F0 (on Top) → F6 (join)
    with BuildSketch(Plane.XY):
        with BuildLine():
            Line((2.54, 20.281668), (2.54, 6.35))
            ThreePointArc((2.54, 6.35), (3.655923, 3.655923), (6.35, 2.54))
            Line((6.35, 2.54), (15.046535, 2.54))
            ThreePointArc((15.046535, 2.54), (17.291599, 3.469936), (18.221535, 5.715))
            Line((18.221535, 5.715), (18.221535, 20.281668))
            Line((18.221535, 20.281668), (2.54, 20.281668))
        make_face()
        with Locations((6.35, 6.35)):
            Circle(F0_R_2, mode=Mode.SUBTRACT)
    extrude(amount=F6_DEPTH)

    # F0 (on Top) → F7 (join)
    with BuildSketch(Plane.XY):
        with BuildLine():
            Line((102.519207, 70.572822), (102.673301, 55.918332))
            Line((102.673301, 55.918332), (124.46, 55.918332))
            Line((124.46, 55.918332), (124.46, 69.85))
            ThreePointArc((124.46, 69.85), (123.344077, 72.544077), (120.65, 73.66))
            Line((120.65, 73.66), (105.692992, 73.66))
            ThreePointArc((105.692992, 73.66), (103.479196, 72.760902), (102.519207, 70.572822))
        make_face()
        with Locations((120.65, 69.85)):
            Circle(F0_R_2, mode=Mode.SUBTRACT)
        with BuildLine():
            Line((2.54, 69.85), (2.54, 55.918332))
            Line((2.54, 55.918332), (18.221535, 55.918332))
            Line((18.221535, 55.918332), (18.221535, 70.485))
            ThreePointArc((18.221535, 70.485), (17.291599, 72.730064), (15.046535, 73.66))
            Line((15.046535, 73.66), (6.35, 73.66))
            ThreePointArc((6.35, 73.66), (3.655923, 72.544077), (2.54, 69.85))
        make_face()
        with Locations((6.35, 69.85)):
            Circle(F0_R_2, mode=Mode.SUBTRACT)
        with BuildLine():
            Line((124.46, 6.35), (124.46, 20.257623))
            Line((124.46, 20.257623), (102.693864, 20.281668))
            Line((102.693864, 20.281668), (102.693864, 5.711489))
            ThreePointArc((102.693864, 5.711489), (103.625039, 3.468695), (105.868862, 2.54))
            Line((105.868862, 2.54), (120.65, 2.54))
            ThreePointArc((120.65, 2.54), (123.344077, 3.655923), (124.46, 6.35))
        make_face()
        with Locations((120.65, 6.35)):
            Circle(F0_R_2, mode=Mode.SUBTRACT)
    extrude(amount=F7_DEPTH)


solid = f1.part
